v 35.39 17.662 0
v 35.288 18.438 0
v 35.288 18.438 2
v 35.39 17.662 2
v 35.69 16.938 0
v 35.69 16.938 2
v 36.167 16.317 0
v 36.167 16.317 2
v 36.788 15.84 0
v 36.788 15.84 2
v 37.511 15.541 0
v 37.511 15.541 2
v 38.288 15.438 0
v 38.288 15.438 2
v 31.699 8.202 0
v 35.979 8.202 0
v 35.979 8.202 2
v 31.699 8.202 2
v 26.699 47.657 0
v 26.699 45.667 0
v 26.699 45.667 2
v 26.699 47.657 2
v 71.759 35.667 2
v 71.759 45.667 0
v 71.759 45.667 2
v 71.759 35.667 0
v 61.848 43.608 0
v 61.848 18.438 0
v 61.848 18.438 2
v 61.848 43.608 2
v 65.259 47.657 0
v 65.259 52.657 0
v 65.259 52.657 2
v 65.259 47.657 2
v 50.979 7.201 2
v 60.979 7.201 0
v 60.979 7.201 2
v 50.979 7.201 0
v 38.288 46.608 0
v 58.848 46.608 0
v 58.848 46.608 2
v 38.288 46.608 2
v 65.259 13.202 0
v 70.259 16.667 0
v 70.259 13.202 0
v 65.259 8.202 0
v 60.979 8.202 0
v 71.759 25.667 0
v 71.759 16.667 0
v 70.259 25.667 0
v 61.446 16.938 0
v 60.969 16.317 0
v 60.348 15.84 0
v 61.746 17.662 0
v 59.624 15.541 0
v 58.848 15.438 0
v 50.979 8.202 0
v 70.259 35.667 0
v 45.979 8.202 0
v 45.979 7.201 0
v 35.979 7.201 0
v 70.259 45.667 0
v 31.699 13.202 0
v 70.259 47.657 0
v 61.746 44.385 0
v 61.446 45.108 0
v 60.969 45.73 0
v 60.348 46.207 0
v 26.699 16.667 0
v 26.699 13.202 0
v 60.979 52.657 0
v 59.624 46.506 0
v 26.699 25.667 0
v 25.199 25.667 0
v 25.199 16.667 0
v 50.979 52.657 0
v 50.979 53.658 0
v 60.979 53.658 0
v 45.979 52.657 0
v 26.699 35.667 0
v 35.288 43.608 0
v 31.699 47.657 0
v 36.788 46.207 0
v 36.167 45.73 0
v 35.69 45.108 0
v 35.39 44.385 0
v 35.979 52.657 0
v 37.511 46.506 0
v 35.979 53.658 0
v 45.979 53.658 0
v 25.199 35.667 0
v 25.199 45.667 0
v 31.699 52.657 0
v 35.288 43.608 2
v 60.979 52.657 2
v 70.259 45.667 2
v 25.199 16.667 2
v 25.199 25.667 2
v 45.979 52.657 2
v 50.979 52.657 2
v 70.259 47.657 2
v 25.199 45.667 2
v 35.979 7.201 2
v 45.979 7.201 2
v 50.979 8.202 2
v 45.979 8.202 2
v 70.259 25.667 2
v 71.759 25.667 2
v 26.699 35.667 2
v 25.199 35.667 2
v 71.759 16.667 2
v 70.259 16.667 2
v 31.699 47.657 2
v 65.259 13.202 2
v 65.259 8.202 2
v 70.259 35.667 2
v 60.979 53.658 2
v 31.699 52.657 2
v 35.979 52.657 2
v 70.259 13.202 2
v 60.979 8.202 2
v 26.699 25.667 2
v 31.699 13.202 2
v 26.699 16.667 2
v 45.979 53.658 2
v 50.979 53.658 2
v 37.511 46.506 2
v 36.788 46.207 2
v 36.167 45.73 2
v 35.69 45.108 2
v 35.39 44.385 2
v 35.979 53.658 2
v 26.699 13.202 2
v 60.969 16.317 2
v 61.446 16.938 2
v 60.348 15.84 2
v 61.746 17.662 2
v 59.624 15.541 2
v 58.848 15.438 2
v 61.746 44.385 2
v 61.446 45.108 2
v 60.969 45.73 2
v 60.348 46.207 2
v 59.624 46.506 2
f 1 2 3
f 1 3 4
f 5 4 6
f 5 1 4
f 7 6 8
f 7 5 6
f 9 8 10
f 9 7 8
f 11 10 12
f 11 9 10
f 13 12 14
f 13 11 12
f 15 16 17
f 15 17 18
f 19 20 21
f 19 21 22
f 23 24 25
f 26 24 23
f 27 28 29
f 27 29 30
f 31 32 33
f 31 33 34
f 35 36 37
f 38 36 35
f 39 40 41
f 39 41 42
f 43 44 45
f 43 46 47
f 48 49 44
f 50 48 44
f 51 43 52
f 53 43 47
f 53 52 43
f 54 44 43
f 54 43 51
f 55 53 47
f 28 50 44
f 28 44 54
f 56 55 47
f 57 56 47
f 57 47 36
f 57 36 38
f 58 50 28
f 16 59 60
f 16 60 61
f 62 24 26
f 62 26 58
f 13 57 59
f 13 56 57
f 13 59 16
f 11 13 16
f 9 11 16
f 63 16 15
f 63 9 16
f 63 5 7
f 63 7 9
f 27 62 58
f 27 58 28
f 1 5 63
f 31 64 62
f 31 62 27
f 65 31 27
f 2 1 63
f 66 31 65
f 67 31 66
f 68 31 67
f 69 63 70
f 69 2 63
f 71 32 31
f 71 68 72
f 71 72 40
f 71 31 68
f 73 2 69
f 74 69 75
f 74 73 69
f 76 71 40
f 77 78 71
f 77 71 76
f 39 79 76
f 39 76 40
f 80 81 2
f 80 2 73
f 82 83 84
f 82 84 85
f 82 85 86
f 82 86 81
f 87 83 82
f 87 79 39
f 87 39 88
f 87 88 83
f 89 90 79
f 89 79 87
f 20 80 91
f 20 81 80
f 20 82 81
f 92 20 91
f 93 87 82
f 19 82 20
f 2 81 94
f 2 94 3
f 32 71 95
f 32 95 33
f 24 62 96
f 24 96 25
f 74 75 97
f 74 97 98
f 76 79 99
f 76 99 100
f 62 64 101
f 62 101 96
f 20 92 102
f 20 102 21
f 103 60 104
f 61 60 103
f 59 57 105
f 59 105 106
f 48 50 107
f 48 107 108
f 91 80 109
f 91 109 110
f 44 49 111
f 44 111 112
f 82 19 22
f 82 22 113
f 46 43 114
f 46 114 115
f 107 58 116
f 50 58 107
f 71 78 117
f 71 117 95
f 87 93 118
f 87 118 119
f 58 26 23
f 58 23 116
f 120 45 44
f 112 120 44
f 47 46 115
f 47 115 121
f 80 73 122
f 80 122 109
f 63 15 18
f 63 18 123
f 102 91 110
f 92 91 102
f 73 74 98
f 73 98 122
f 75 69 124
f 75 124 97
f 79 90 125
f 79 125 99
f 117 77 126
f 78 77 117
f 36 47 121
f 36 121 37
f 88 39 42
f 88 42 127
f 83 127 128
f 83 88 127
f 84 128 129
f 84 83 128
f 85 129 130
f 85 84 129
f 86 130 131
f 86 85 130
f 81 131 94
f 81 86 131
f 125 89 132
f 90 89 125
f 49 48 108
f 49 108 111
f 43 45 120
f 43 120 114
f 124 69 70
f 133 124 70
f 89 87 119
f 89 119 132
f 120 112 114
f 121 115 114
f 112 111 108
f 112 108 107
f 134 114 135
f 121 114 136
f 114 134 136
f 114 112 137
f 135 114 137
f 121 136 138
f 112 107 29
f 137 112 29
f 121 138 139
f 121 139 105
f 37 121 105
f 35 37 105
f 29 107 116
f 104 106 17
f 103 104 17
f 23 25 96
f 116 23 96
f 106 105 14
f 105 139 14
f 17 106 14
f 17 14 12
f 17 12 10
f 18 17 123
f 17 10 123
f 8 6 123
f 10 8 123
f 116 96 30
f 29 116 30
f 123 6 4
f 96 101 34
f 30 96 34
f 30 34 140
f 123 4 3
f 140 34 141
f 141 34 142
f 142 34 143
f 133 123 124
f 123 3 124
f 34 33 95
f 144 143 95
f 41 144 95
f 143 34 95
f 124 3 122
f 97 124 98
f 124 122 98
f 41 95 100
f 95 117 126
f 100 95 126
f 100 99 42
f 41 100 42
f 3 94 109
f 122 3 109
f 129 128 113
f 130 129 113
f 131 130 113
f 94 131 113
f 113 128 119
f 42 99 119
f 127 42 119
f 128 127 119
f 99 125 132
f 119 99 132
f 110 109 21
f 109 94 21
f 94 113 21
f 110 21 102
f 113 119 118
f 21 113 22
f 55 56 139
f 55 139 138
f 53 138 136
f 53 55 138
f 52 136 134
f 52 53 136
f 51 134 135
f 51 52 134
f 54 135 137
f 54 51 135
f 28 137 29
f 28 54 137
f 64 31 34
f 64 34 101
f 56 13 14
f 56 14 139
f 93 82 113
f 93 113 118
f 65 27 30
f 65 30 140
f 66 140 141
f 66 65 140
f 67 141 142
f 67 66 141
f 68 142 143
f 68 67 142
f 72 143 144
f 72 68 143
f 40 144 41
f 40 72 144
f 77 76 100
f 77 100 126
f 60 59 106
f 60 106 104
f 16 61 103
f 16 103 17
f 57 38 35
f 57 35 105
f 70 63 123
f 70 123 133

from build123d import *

# Parameters (mm, degrees)
EXTRUDE_1_DEPTH = 2


with BuildPart() as part:
    # Model → 凸台-拉伸1 (new body)
    with BuildSketch(Plane.XY):
        Polygon((31.698795353, 52.657311482), (35.978795353, 52.657311482), (35.978795353, 53.657667188), (45.978795353, 53.657667188), (45.978795353, 52.657311482), (50.978795353, 52.657311482), (50.978795353, 53.657667188), (60.978795353, 53.657667188), (60.978795353, 52.657311482), (65.258795353, 52.657311482), (65.258795353, 47.657311482), (70.258795353, 47.657311482), (70.258795353, 45.667311482), (71.758795353, 45.667311482), (71.758795353, 35.667311482), (70.258795353, 35.667311482), (70.258795353, 25.667311482), (71.758795353, 25.667311482), (71.758795353, 16.667311482), (70.258795353, 16.667311482), (70.258795353, 15.517311482), (70.258795353, 13.201678386), (65.258795353, 13.201678386), (65.258795353, 8.201678386), (60.978795353, 8.201678386), (60.978795353, 7.20132268), (50.978795353, 7.20132268), (50.978795353, 8.201678386), (45.978795353, 8.201678386), (45.978795353, 7.20132268), (35.978795353, 7.20132268), (35.978795353, 8.201678386), (31.698795353, 8.201678386), (31.698795353, 13.201678386), (26.698795353, 13.201678386), (26.698795353, 15.517311482), (26.698795353, 16.667311482), (25.198795353, 16.667311482), (25.198795353, 25.667311482), (26.698795353, 25.667311482), (26.698795353, 35.667311482), (25.198795353, 35.667311482), (25.198795353, 45.667311482), (26.698795353, 45.667311482), (26.698795353, 47.657311482), (31.698795353, 47.657311482), align=None)
        with BuildLine():
            Line((58.847883072, 46.60843734), (38.287883072, 46.60843734))
            ThreePointArc((38.287883072, 46.60843734), (36.166562728, 45.729757683), (35.287883072, 43.60843734))
            Line((35.287883072, 43.60843734), (35.287883072, 18.43843734))
            ThreePointArc((35.287883072, 18.43843734), (36.166562728, 16.317116996), (38.287883072, 15.43843734))
            Line((38.287883072, 15.43843734), (58.847883072, 15.43843734))
            ThreePointArc((58.847883072, 15.43843734), (60.969203415, 16.317116996), (61.847883072, 18.43843734))
            Line((61.847883072, 18.43843734), (61.847883072, 43.60843734))
            ThreePointArc((61.847883072, 43.60843734), (60.969203415, 45.729757683), (58.847883072, 46.60843734))
        make_face(mode=Mode.SUBTRACT)
    extrude(amount=EXTRUDE_1_DEPTH)


solid = part.part
